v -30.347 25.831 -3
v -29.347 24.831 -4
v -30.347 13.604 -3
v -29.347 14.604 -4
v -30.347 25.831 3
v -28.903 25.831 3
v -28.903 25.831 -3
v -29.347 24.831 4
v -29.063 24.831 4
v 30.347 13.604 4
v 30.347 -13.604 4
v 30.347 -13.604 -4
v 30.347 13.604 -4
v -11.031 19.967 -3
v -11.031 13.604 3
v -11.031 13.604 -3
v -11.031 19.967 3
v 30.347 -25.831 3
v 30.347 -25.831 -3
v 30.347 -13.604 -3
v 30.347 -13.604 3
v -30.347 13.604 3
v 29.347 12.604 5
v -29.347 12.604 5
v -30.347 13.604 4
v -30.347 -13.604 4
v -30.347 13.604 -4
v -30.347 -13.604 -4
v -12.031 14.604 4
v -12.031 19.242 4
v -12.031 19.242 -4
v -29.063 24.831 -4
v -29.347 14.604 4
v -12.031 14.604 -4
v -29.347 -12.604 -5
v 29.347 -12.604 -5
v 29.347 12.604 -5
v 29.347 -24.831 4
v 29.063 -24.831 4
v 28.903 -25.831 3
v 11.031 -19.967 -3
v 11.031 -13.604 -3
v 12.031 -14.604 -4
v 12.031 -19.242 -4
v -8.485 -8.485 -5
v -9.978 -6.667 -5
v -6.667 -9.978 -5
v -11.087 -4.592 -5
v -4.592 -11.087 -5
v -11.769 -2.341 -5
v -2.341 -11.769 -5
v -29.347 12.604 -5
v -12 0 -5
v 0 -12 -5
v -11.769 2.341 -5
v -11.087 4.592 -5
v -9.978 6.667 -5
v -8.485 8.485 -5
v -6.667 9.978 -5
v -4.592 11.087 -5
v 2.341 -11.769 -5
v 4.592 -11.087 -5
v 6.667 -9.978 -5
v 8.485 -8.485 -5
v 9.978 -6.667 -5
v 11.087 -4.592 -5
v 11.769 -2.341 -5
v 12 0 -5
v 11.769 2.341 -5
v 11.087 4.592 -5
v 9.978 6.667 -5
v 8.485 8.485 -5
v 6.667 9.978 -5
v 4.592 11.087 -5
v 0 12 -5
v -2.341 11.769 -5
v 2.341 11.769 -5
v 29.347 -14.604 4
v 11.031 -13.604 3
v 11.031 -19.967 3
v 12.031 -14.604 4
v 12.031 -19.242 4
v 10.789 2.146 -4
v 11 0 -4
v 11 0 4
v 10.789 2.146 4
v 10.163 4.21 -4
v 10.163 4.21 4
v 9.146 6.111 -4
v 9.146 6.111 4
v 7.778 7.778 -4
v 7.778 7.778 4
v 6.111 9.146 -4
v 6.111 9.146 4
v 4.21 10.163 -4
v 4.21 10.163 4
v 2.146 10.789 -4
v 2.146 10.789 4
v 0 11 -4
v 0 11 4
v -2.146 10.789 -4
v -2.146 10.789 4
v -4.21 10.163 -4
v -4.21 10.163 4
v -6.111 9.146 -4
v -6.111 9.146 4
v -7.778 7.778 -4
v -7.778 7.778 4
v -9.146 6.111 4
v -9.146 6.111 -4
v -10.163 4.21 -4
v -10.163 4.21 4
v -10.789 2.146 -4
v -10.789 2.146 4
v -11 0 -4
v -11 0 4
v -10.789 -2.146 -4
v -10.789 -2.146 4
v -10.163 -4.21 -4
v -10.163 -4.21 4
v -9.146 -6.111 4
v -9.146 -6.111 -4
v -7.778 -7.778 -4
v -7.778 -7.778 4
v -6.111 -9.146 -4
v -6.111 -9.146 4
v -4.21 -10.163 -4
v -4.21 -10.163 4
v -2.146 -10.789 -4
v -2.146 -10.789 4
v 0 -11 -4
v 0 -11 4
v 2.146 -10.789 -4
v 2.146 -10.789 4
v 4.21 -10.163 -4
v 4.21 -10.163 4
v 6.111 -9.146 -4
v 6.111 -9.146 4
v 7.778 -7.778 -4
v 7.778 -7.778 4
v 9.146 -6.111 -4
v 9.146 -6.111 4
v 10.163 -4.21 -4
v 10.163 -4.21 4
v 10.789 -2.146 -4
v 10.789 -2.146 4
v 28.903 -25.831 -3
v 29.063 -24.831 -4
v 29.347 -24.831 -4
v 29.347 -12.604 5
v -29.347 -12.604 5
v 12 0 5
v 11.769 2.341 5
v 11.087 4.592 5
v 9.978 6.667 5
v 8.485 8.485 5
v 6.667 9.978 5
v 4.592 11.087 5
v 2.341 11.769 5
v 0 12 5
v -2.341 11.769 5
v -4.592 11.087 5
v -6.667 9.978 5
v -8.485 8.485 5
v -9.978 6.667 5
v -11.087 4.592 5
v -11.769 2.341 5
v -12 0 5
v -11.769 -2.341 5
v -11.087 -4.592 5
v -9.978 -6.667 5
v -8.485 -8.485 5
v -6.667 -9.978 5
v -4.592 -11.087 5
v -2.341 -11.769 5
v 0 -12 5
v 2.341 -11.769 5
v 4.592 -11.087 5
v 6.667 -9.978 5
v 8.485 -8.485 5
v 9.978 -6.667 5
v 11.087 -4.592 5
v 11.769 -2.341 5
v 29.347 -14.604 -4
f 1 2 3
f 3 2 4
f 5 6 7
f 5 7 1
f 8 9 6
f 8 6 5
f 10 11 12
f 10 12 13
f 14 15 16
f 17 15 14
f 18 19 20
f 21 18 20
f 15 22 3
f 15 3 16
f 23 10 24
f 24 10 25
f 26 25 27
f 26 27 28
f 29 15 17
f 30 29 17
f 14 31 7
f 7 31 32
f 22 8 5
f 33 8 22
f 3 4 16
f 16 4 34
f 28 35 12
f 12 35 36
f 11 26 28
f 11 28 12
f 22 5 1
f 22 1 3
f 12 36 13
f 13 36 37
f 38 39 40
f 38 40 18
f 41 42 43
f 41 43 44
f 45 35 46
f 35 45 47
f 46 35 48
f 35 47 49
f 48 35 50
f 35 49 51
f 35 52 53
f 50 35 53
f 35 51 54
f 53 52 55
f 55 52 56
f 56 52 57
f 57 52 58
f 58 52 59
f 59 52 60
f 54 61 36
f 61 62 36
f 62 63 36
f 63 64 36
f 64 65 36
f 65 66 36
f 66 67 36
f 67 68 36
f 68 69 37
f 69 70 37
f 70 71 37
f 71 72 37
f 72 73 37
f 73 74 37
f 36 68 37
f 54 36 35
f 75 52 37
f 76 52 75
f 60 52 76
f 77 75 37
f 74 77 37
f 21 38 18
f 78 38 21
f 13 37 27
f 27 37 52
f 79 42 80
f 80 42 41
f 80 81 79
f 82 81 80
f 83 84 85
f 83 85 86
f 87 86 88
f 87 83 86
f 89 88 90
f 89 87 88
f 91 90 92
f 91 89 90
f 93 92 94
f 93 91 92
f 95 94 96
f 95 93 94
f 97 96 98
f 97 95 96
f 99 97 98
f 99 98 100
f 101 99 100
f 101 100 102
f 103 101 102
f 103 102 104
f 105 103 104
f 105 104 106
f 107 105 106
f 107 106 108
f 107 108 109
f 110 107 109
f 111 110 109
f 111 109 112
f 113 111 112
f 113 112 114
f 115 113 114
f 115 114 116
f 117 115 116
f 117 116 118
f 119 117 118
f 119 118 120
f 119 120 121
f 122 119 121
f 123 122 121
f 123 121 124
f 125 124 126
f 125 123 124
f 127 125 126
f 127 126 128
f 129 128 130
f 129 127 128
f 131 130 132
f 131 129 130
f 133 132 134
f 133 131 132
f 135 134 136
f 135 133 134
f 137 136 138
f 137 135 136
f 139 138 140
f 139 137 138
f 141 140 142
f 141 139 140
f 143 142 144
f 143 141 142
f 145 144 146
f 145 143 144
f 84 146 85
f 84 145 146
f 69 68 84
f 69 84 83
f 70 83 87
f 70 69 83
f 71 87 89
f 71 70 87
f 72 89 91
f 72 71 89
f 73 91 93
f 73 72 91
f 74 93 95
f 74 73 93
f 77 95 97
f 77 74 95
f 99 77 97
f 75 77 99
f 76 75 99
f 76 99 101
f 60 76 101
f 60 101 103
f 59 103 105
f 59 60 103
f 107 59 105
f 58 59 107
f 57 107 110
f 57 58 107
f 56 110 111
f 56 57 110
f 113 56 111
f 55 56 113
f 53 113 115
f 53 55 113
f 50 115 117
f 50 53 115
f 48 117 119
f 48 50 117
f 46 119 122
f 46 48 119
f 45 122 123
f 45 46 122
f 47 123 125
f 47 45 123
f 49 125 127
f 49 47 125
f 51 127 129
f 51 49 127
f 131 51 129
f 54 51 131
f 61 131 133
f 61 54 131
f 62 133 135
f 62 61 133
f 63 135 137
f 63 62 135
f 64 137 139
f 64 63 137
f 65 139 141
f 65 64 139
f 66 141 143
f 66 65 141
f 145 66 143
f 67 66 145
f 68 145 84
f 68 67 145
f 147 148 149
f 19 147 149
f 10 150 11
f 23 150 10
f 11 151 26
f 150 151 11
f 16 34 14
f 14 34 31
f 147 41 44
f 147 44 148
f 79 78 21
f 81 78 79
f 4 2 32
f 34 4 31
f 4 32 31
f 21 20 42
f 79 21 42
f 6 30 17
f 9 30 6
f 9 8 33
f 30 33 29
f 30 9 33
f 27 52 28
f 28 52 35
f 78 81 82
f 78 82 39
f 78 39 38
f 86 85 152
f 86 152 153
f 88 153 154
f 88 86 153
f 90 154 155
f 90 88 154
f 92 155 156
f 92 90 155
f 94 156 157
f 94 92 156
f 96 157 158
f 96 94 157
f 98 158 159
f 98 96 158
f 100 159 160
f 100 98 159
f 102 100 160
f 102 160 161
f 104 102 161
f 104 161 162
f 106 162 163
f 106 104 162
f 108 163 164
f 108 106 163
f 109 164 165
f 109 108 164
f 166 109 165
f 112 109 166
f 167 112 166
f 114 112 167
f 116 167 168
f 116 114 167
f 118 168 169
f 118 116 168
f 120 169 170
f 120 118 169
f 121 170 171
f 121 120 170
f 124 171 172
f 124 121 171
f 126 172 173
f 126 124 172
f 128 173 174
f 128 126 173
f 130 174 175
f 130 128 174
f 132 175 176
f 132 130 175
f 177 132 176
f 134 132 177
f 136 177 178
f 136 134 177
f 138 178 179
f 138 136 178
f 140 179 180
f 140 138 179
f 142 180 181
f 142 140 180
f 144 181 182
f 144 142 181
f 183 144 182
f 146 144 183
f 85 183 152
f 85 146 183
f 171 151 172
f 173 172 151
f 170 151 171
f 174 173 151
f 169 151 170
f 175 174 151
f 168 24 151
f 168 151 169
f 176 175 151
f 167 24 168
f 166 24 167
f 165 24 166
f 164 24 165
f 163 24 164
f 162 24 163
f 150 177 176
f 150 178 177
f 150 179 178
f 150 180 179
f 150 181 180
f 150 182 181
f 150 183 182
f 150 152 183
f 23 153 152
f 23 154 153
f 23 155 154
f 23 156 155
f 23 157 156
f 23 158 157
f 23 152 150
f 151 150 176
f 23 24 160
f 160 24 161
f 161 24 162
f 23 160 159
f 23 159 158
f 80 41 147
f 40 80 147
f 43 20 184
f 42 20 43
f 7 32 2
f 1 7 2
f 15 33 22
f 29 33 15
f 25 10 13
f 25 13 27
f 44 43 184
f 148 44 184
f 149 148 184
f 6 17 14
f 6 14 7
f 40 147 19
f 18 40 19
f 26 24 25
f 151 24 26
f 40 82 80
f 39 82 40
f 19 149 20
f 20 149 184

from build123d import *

# Parameters (mm, degrees)
F1_DEPTH  = 4
F0_R      = 11
F2_DEPTH  = 5
F3_SIZE   = 1
F3_2_SIZE = 1


with BuildPart() as f1:
    # F0 (on Top) → F1 (new body, symmetric)
    with BuildSketch(Plane.XY):
        Polygon((30.34697, -25.831118), (30.34697, -13.603815), (11.030585, -13.603815), (11.030585, -19.966755), (28.902927, -25.831118), align=None)
        Polygon((-30.34697, 13.603815), (-11.030585, 13.603815), (-11.030585, 19.966755), (-28.902927, 25.831118), (-30.34697, 25.831118), align=None)
    extrude(amount=F1_DEPTH, both=True)

    # F3#2
    f3_2_edges = [f1.edges().sort_by_distance(p)[0] for p in [
        (30.34697, -19.717466, -4),
        (20.688777, -13.603815, -4),
        (11.030585, -16.785285, -4),
        (19.966756, -22.898937, -4),
        (29.624949, -25.831118, -4),
        (-20.688777, 13.603815, -4),
        (-11.030585, 16.785285, -4),
        (-19.966756, 22.898937, -4),
        (-29.624949, 25.831118, -4),
        (-30.34697, 19.717466, -4),
        (-20.688777, 13.603815, 4),
        (-11.030585, 16.785285, 4),
        (-19.966756, 22.898937, 4),
        (-29.624949, 25.831118, 4),
        (-30.34697, 19.717466, 4),
        (30.34697, -19.717466, 4),
        (20.688777, -13.603815, 4),
        (11.030585, -16.785285, 4),
        (19.966756, -22.898937, 4),
        (29.624949, -25.831118, 4),
    ]]
    chamfer(f3_2_edges, length=F3_2_SIZE)


with BuildPart() as f2:
    # F0 (on Top) → F2 (new body, symmetric)
    with BuildSketch(Plane.XY):
        Polygon((11.030585, -13.603815), (30.34697, -13.603815), (30.34697, 13.603815), (-11.030585, 13.603815), (-30.34697, 13.603815), (-30.34697, -13.603815), align=None)
        Circle(F0_R, mode=Mode.SUBTRACT)
    extrude(amount=F2_DEPTH, both=True)

    # F3
    f3_edges = [f2.edges().sort_by_distance(p)[0] for p in [
        (0, -13.603815, 5),
        (30.34697, 0, 5),
        (0, 13.603815, 5),
        (-30.34697, 0, 5),
        (-11, 0, 5),
        (0, -13.603815, -5),
        (30.34697, 0, -5),
        (0, 13.603815, -5),
        (-30.34697, 0, -5),
        (-11, 0, -5),
    ]]
    chamfer(f3_edges, length=F3_SIZE)


solid = Compound([f1.part, f2.part])
